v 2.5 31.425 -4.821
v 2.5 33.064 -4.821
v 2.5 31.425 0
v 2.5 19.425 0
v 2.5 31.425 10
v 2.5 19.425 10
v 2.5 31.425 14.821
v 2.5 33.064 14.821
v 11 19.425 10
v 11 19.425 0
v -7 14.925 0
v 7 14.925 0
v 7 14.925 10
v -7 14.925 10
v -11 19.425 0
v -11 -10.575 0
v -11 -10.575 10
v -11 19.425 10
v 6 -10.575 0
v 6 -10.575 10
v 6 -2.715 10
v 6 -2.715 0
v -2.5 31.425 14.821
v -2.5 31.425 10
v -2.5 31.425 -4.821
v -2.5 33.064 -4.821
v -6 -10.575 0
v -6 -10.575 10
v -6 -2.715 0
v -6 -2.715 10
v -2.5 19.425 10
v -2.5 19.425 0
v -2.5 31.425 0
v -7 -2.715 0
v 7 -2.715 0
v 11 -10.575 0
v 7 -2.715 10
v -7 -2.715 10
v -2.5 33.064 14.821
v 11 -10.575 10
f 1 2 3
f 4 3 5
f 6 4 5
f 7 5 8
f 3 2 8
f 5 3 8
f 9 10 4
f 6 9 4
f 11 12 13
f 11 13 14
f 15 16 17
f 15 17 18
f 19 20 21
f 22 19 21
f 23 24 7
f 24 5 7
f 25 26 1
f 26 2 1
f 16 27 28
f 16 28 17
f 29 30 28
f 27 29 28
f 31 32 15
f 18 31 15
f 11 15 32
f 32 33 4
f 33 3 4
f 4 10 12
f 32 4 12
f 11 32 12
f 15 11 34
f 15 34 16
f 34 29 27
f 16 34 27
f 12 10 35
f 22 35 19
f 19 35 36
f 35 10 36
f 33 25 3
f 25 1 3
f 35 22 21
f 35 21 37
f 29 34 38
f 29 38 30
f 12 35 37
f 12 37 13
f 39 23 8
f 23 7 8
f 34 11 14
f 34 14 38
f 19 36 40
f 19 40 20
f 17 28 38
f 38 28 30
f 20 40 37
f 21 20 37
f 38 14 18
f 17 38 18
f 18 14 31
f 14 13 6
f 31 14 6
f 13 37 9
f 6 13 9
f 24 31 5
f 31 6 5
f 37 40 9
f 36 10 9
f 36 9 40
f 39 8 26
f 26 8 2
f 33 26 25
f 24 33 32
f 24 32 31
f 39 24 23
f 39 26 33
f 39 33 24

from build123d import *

# Parameters (mm, degrees)
EXTRUDE_1_DEPTH = 10
EXTRUDE_2_DEPTH = 2.5
EXTRUDE_3_DEPTH = 2.5


with BuildPart() as part:
    # 草图1 → 凸台-拉伸1 (new body)
    with BuildSketch(Plane.XY):
        Polygon((-6, -2.715432056), (-6, -10.574613101), (-11, -10.574613101), (-11, 19.425386899), (-5, 19.425386899), (5, 19.425386899), (11, 19.425386899), (11, -10.574613101), (6, -10.574613101), (6, -2.715432056), (7, -2.715432056), (7, 14.925386899), (-7, 14.925386899), (-7, -2.715432056), align=None)
    extrude(amount=EXTRUDE_1_DEPTH)

    # 草图2 → 凸台-拉伸2 (add)
    with BuildSketch(Plane(origin=(0, 0, 0), x_dir=(0, 0, -1), z_dir=(1, 0, 0))):
        Polygon((-10, 19.425386899), (-10, 31.425386899), (-14.821209098, 31.425386899), (-14.821209098, 33.063700588), (4.821209098, 33.063700588), (4.821209098, 31.425386899), (0, 31.425386899), (0, 19.425386899), align=None)
    extrude(amount=EXTRUDE_2_DEPTH)

    # 草图2<2> → 凸台-拉伸3 (add)
    with BuildSketch(Plane(origin=(0, 0, 0), x_dir=(0, 0, -1), z_dir=(1, 0, 0))):
        Polygon((-10, 19.425386899), (-10, 31.425386899), (-14.821209098, 31.425386899), (-14.821209098, 33.063700588), (4.821209098, 33.063700588), (4.821209098, 31.425386899), (0, 31.425386899), (0, 19.425386899), align=None)
    extrude(amount=-EXTRUDE_3_DEPTH)


solid = part.part
